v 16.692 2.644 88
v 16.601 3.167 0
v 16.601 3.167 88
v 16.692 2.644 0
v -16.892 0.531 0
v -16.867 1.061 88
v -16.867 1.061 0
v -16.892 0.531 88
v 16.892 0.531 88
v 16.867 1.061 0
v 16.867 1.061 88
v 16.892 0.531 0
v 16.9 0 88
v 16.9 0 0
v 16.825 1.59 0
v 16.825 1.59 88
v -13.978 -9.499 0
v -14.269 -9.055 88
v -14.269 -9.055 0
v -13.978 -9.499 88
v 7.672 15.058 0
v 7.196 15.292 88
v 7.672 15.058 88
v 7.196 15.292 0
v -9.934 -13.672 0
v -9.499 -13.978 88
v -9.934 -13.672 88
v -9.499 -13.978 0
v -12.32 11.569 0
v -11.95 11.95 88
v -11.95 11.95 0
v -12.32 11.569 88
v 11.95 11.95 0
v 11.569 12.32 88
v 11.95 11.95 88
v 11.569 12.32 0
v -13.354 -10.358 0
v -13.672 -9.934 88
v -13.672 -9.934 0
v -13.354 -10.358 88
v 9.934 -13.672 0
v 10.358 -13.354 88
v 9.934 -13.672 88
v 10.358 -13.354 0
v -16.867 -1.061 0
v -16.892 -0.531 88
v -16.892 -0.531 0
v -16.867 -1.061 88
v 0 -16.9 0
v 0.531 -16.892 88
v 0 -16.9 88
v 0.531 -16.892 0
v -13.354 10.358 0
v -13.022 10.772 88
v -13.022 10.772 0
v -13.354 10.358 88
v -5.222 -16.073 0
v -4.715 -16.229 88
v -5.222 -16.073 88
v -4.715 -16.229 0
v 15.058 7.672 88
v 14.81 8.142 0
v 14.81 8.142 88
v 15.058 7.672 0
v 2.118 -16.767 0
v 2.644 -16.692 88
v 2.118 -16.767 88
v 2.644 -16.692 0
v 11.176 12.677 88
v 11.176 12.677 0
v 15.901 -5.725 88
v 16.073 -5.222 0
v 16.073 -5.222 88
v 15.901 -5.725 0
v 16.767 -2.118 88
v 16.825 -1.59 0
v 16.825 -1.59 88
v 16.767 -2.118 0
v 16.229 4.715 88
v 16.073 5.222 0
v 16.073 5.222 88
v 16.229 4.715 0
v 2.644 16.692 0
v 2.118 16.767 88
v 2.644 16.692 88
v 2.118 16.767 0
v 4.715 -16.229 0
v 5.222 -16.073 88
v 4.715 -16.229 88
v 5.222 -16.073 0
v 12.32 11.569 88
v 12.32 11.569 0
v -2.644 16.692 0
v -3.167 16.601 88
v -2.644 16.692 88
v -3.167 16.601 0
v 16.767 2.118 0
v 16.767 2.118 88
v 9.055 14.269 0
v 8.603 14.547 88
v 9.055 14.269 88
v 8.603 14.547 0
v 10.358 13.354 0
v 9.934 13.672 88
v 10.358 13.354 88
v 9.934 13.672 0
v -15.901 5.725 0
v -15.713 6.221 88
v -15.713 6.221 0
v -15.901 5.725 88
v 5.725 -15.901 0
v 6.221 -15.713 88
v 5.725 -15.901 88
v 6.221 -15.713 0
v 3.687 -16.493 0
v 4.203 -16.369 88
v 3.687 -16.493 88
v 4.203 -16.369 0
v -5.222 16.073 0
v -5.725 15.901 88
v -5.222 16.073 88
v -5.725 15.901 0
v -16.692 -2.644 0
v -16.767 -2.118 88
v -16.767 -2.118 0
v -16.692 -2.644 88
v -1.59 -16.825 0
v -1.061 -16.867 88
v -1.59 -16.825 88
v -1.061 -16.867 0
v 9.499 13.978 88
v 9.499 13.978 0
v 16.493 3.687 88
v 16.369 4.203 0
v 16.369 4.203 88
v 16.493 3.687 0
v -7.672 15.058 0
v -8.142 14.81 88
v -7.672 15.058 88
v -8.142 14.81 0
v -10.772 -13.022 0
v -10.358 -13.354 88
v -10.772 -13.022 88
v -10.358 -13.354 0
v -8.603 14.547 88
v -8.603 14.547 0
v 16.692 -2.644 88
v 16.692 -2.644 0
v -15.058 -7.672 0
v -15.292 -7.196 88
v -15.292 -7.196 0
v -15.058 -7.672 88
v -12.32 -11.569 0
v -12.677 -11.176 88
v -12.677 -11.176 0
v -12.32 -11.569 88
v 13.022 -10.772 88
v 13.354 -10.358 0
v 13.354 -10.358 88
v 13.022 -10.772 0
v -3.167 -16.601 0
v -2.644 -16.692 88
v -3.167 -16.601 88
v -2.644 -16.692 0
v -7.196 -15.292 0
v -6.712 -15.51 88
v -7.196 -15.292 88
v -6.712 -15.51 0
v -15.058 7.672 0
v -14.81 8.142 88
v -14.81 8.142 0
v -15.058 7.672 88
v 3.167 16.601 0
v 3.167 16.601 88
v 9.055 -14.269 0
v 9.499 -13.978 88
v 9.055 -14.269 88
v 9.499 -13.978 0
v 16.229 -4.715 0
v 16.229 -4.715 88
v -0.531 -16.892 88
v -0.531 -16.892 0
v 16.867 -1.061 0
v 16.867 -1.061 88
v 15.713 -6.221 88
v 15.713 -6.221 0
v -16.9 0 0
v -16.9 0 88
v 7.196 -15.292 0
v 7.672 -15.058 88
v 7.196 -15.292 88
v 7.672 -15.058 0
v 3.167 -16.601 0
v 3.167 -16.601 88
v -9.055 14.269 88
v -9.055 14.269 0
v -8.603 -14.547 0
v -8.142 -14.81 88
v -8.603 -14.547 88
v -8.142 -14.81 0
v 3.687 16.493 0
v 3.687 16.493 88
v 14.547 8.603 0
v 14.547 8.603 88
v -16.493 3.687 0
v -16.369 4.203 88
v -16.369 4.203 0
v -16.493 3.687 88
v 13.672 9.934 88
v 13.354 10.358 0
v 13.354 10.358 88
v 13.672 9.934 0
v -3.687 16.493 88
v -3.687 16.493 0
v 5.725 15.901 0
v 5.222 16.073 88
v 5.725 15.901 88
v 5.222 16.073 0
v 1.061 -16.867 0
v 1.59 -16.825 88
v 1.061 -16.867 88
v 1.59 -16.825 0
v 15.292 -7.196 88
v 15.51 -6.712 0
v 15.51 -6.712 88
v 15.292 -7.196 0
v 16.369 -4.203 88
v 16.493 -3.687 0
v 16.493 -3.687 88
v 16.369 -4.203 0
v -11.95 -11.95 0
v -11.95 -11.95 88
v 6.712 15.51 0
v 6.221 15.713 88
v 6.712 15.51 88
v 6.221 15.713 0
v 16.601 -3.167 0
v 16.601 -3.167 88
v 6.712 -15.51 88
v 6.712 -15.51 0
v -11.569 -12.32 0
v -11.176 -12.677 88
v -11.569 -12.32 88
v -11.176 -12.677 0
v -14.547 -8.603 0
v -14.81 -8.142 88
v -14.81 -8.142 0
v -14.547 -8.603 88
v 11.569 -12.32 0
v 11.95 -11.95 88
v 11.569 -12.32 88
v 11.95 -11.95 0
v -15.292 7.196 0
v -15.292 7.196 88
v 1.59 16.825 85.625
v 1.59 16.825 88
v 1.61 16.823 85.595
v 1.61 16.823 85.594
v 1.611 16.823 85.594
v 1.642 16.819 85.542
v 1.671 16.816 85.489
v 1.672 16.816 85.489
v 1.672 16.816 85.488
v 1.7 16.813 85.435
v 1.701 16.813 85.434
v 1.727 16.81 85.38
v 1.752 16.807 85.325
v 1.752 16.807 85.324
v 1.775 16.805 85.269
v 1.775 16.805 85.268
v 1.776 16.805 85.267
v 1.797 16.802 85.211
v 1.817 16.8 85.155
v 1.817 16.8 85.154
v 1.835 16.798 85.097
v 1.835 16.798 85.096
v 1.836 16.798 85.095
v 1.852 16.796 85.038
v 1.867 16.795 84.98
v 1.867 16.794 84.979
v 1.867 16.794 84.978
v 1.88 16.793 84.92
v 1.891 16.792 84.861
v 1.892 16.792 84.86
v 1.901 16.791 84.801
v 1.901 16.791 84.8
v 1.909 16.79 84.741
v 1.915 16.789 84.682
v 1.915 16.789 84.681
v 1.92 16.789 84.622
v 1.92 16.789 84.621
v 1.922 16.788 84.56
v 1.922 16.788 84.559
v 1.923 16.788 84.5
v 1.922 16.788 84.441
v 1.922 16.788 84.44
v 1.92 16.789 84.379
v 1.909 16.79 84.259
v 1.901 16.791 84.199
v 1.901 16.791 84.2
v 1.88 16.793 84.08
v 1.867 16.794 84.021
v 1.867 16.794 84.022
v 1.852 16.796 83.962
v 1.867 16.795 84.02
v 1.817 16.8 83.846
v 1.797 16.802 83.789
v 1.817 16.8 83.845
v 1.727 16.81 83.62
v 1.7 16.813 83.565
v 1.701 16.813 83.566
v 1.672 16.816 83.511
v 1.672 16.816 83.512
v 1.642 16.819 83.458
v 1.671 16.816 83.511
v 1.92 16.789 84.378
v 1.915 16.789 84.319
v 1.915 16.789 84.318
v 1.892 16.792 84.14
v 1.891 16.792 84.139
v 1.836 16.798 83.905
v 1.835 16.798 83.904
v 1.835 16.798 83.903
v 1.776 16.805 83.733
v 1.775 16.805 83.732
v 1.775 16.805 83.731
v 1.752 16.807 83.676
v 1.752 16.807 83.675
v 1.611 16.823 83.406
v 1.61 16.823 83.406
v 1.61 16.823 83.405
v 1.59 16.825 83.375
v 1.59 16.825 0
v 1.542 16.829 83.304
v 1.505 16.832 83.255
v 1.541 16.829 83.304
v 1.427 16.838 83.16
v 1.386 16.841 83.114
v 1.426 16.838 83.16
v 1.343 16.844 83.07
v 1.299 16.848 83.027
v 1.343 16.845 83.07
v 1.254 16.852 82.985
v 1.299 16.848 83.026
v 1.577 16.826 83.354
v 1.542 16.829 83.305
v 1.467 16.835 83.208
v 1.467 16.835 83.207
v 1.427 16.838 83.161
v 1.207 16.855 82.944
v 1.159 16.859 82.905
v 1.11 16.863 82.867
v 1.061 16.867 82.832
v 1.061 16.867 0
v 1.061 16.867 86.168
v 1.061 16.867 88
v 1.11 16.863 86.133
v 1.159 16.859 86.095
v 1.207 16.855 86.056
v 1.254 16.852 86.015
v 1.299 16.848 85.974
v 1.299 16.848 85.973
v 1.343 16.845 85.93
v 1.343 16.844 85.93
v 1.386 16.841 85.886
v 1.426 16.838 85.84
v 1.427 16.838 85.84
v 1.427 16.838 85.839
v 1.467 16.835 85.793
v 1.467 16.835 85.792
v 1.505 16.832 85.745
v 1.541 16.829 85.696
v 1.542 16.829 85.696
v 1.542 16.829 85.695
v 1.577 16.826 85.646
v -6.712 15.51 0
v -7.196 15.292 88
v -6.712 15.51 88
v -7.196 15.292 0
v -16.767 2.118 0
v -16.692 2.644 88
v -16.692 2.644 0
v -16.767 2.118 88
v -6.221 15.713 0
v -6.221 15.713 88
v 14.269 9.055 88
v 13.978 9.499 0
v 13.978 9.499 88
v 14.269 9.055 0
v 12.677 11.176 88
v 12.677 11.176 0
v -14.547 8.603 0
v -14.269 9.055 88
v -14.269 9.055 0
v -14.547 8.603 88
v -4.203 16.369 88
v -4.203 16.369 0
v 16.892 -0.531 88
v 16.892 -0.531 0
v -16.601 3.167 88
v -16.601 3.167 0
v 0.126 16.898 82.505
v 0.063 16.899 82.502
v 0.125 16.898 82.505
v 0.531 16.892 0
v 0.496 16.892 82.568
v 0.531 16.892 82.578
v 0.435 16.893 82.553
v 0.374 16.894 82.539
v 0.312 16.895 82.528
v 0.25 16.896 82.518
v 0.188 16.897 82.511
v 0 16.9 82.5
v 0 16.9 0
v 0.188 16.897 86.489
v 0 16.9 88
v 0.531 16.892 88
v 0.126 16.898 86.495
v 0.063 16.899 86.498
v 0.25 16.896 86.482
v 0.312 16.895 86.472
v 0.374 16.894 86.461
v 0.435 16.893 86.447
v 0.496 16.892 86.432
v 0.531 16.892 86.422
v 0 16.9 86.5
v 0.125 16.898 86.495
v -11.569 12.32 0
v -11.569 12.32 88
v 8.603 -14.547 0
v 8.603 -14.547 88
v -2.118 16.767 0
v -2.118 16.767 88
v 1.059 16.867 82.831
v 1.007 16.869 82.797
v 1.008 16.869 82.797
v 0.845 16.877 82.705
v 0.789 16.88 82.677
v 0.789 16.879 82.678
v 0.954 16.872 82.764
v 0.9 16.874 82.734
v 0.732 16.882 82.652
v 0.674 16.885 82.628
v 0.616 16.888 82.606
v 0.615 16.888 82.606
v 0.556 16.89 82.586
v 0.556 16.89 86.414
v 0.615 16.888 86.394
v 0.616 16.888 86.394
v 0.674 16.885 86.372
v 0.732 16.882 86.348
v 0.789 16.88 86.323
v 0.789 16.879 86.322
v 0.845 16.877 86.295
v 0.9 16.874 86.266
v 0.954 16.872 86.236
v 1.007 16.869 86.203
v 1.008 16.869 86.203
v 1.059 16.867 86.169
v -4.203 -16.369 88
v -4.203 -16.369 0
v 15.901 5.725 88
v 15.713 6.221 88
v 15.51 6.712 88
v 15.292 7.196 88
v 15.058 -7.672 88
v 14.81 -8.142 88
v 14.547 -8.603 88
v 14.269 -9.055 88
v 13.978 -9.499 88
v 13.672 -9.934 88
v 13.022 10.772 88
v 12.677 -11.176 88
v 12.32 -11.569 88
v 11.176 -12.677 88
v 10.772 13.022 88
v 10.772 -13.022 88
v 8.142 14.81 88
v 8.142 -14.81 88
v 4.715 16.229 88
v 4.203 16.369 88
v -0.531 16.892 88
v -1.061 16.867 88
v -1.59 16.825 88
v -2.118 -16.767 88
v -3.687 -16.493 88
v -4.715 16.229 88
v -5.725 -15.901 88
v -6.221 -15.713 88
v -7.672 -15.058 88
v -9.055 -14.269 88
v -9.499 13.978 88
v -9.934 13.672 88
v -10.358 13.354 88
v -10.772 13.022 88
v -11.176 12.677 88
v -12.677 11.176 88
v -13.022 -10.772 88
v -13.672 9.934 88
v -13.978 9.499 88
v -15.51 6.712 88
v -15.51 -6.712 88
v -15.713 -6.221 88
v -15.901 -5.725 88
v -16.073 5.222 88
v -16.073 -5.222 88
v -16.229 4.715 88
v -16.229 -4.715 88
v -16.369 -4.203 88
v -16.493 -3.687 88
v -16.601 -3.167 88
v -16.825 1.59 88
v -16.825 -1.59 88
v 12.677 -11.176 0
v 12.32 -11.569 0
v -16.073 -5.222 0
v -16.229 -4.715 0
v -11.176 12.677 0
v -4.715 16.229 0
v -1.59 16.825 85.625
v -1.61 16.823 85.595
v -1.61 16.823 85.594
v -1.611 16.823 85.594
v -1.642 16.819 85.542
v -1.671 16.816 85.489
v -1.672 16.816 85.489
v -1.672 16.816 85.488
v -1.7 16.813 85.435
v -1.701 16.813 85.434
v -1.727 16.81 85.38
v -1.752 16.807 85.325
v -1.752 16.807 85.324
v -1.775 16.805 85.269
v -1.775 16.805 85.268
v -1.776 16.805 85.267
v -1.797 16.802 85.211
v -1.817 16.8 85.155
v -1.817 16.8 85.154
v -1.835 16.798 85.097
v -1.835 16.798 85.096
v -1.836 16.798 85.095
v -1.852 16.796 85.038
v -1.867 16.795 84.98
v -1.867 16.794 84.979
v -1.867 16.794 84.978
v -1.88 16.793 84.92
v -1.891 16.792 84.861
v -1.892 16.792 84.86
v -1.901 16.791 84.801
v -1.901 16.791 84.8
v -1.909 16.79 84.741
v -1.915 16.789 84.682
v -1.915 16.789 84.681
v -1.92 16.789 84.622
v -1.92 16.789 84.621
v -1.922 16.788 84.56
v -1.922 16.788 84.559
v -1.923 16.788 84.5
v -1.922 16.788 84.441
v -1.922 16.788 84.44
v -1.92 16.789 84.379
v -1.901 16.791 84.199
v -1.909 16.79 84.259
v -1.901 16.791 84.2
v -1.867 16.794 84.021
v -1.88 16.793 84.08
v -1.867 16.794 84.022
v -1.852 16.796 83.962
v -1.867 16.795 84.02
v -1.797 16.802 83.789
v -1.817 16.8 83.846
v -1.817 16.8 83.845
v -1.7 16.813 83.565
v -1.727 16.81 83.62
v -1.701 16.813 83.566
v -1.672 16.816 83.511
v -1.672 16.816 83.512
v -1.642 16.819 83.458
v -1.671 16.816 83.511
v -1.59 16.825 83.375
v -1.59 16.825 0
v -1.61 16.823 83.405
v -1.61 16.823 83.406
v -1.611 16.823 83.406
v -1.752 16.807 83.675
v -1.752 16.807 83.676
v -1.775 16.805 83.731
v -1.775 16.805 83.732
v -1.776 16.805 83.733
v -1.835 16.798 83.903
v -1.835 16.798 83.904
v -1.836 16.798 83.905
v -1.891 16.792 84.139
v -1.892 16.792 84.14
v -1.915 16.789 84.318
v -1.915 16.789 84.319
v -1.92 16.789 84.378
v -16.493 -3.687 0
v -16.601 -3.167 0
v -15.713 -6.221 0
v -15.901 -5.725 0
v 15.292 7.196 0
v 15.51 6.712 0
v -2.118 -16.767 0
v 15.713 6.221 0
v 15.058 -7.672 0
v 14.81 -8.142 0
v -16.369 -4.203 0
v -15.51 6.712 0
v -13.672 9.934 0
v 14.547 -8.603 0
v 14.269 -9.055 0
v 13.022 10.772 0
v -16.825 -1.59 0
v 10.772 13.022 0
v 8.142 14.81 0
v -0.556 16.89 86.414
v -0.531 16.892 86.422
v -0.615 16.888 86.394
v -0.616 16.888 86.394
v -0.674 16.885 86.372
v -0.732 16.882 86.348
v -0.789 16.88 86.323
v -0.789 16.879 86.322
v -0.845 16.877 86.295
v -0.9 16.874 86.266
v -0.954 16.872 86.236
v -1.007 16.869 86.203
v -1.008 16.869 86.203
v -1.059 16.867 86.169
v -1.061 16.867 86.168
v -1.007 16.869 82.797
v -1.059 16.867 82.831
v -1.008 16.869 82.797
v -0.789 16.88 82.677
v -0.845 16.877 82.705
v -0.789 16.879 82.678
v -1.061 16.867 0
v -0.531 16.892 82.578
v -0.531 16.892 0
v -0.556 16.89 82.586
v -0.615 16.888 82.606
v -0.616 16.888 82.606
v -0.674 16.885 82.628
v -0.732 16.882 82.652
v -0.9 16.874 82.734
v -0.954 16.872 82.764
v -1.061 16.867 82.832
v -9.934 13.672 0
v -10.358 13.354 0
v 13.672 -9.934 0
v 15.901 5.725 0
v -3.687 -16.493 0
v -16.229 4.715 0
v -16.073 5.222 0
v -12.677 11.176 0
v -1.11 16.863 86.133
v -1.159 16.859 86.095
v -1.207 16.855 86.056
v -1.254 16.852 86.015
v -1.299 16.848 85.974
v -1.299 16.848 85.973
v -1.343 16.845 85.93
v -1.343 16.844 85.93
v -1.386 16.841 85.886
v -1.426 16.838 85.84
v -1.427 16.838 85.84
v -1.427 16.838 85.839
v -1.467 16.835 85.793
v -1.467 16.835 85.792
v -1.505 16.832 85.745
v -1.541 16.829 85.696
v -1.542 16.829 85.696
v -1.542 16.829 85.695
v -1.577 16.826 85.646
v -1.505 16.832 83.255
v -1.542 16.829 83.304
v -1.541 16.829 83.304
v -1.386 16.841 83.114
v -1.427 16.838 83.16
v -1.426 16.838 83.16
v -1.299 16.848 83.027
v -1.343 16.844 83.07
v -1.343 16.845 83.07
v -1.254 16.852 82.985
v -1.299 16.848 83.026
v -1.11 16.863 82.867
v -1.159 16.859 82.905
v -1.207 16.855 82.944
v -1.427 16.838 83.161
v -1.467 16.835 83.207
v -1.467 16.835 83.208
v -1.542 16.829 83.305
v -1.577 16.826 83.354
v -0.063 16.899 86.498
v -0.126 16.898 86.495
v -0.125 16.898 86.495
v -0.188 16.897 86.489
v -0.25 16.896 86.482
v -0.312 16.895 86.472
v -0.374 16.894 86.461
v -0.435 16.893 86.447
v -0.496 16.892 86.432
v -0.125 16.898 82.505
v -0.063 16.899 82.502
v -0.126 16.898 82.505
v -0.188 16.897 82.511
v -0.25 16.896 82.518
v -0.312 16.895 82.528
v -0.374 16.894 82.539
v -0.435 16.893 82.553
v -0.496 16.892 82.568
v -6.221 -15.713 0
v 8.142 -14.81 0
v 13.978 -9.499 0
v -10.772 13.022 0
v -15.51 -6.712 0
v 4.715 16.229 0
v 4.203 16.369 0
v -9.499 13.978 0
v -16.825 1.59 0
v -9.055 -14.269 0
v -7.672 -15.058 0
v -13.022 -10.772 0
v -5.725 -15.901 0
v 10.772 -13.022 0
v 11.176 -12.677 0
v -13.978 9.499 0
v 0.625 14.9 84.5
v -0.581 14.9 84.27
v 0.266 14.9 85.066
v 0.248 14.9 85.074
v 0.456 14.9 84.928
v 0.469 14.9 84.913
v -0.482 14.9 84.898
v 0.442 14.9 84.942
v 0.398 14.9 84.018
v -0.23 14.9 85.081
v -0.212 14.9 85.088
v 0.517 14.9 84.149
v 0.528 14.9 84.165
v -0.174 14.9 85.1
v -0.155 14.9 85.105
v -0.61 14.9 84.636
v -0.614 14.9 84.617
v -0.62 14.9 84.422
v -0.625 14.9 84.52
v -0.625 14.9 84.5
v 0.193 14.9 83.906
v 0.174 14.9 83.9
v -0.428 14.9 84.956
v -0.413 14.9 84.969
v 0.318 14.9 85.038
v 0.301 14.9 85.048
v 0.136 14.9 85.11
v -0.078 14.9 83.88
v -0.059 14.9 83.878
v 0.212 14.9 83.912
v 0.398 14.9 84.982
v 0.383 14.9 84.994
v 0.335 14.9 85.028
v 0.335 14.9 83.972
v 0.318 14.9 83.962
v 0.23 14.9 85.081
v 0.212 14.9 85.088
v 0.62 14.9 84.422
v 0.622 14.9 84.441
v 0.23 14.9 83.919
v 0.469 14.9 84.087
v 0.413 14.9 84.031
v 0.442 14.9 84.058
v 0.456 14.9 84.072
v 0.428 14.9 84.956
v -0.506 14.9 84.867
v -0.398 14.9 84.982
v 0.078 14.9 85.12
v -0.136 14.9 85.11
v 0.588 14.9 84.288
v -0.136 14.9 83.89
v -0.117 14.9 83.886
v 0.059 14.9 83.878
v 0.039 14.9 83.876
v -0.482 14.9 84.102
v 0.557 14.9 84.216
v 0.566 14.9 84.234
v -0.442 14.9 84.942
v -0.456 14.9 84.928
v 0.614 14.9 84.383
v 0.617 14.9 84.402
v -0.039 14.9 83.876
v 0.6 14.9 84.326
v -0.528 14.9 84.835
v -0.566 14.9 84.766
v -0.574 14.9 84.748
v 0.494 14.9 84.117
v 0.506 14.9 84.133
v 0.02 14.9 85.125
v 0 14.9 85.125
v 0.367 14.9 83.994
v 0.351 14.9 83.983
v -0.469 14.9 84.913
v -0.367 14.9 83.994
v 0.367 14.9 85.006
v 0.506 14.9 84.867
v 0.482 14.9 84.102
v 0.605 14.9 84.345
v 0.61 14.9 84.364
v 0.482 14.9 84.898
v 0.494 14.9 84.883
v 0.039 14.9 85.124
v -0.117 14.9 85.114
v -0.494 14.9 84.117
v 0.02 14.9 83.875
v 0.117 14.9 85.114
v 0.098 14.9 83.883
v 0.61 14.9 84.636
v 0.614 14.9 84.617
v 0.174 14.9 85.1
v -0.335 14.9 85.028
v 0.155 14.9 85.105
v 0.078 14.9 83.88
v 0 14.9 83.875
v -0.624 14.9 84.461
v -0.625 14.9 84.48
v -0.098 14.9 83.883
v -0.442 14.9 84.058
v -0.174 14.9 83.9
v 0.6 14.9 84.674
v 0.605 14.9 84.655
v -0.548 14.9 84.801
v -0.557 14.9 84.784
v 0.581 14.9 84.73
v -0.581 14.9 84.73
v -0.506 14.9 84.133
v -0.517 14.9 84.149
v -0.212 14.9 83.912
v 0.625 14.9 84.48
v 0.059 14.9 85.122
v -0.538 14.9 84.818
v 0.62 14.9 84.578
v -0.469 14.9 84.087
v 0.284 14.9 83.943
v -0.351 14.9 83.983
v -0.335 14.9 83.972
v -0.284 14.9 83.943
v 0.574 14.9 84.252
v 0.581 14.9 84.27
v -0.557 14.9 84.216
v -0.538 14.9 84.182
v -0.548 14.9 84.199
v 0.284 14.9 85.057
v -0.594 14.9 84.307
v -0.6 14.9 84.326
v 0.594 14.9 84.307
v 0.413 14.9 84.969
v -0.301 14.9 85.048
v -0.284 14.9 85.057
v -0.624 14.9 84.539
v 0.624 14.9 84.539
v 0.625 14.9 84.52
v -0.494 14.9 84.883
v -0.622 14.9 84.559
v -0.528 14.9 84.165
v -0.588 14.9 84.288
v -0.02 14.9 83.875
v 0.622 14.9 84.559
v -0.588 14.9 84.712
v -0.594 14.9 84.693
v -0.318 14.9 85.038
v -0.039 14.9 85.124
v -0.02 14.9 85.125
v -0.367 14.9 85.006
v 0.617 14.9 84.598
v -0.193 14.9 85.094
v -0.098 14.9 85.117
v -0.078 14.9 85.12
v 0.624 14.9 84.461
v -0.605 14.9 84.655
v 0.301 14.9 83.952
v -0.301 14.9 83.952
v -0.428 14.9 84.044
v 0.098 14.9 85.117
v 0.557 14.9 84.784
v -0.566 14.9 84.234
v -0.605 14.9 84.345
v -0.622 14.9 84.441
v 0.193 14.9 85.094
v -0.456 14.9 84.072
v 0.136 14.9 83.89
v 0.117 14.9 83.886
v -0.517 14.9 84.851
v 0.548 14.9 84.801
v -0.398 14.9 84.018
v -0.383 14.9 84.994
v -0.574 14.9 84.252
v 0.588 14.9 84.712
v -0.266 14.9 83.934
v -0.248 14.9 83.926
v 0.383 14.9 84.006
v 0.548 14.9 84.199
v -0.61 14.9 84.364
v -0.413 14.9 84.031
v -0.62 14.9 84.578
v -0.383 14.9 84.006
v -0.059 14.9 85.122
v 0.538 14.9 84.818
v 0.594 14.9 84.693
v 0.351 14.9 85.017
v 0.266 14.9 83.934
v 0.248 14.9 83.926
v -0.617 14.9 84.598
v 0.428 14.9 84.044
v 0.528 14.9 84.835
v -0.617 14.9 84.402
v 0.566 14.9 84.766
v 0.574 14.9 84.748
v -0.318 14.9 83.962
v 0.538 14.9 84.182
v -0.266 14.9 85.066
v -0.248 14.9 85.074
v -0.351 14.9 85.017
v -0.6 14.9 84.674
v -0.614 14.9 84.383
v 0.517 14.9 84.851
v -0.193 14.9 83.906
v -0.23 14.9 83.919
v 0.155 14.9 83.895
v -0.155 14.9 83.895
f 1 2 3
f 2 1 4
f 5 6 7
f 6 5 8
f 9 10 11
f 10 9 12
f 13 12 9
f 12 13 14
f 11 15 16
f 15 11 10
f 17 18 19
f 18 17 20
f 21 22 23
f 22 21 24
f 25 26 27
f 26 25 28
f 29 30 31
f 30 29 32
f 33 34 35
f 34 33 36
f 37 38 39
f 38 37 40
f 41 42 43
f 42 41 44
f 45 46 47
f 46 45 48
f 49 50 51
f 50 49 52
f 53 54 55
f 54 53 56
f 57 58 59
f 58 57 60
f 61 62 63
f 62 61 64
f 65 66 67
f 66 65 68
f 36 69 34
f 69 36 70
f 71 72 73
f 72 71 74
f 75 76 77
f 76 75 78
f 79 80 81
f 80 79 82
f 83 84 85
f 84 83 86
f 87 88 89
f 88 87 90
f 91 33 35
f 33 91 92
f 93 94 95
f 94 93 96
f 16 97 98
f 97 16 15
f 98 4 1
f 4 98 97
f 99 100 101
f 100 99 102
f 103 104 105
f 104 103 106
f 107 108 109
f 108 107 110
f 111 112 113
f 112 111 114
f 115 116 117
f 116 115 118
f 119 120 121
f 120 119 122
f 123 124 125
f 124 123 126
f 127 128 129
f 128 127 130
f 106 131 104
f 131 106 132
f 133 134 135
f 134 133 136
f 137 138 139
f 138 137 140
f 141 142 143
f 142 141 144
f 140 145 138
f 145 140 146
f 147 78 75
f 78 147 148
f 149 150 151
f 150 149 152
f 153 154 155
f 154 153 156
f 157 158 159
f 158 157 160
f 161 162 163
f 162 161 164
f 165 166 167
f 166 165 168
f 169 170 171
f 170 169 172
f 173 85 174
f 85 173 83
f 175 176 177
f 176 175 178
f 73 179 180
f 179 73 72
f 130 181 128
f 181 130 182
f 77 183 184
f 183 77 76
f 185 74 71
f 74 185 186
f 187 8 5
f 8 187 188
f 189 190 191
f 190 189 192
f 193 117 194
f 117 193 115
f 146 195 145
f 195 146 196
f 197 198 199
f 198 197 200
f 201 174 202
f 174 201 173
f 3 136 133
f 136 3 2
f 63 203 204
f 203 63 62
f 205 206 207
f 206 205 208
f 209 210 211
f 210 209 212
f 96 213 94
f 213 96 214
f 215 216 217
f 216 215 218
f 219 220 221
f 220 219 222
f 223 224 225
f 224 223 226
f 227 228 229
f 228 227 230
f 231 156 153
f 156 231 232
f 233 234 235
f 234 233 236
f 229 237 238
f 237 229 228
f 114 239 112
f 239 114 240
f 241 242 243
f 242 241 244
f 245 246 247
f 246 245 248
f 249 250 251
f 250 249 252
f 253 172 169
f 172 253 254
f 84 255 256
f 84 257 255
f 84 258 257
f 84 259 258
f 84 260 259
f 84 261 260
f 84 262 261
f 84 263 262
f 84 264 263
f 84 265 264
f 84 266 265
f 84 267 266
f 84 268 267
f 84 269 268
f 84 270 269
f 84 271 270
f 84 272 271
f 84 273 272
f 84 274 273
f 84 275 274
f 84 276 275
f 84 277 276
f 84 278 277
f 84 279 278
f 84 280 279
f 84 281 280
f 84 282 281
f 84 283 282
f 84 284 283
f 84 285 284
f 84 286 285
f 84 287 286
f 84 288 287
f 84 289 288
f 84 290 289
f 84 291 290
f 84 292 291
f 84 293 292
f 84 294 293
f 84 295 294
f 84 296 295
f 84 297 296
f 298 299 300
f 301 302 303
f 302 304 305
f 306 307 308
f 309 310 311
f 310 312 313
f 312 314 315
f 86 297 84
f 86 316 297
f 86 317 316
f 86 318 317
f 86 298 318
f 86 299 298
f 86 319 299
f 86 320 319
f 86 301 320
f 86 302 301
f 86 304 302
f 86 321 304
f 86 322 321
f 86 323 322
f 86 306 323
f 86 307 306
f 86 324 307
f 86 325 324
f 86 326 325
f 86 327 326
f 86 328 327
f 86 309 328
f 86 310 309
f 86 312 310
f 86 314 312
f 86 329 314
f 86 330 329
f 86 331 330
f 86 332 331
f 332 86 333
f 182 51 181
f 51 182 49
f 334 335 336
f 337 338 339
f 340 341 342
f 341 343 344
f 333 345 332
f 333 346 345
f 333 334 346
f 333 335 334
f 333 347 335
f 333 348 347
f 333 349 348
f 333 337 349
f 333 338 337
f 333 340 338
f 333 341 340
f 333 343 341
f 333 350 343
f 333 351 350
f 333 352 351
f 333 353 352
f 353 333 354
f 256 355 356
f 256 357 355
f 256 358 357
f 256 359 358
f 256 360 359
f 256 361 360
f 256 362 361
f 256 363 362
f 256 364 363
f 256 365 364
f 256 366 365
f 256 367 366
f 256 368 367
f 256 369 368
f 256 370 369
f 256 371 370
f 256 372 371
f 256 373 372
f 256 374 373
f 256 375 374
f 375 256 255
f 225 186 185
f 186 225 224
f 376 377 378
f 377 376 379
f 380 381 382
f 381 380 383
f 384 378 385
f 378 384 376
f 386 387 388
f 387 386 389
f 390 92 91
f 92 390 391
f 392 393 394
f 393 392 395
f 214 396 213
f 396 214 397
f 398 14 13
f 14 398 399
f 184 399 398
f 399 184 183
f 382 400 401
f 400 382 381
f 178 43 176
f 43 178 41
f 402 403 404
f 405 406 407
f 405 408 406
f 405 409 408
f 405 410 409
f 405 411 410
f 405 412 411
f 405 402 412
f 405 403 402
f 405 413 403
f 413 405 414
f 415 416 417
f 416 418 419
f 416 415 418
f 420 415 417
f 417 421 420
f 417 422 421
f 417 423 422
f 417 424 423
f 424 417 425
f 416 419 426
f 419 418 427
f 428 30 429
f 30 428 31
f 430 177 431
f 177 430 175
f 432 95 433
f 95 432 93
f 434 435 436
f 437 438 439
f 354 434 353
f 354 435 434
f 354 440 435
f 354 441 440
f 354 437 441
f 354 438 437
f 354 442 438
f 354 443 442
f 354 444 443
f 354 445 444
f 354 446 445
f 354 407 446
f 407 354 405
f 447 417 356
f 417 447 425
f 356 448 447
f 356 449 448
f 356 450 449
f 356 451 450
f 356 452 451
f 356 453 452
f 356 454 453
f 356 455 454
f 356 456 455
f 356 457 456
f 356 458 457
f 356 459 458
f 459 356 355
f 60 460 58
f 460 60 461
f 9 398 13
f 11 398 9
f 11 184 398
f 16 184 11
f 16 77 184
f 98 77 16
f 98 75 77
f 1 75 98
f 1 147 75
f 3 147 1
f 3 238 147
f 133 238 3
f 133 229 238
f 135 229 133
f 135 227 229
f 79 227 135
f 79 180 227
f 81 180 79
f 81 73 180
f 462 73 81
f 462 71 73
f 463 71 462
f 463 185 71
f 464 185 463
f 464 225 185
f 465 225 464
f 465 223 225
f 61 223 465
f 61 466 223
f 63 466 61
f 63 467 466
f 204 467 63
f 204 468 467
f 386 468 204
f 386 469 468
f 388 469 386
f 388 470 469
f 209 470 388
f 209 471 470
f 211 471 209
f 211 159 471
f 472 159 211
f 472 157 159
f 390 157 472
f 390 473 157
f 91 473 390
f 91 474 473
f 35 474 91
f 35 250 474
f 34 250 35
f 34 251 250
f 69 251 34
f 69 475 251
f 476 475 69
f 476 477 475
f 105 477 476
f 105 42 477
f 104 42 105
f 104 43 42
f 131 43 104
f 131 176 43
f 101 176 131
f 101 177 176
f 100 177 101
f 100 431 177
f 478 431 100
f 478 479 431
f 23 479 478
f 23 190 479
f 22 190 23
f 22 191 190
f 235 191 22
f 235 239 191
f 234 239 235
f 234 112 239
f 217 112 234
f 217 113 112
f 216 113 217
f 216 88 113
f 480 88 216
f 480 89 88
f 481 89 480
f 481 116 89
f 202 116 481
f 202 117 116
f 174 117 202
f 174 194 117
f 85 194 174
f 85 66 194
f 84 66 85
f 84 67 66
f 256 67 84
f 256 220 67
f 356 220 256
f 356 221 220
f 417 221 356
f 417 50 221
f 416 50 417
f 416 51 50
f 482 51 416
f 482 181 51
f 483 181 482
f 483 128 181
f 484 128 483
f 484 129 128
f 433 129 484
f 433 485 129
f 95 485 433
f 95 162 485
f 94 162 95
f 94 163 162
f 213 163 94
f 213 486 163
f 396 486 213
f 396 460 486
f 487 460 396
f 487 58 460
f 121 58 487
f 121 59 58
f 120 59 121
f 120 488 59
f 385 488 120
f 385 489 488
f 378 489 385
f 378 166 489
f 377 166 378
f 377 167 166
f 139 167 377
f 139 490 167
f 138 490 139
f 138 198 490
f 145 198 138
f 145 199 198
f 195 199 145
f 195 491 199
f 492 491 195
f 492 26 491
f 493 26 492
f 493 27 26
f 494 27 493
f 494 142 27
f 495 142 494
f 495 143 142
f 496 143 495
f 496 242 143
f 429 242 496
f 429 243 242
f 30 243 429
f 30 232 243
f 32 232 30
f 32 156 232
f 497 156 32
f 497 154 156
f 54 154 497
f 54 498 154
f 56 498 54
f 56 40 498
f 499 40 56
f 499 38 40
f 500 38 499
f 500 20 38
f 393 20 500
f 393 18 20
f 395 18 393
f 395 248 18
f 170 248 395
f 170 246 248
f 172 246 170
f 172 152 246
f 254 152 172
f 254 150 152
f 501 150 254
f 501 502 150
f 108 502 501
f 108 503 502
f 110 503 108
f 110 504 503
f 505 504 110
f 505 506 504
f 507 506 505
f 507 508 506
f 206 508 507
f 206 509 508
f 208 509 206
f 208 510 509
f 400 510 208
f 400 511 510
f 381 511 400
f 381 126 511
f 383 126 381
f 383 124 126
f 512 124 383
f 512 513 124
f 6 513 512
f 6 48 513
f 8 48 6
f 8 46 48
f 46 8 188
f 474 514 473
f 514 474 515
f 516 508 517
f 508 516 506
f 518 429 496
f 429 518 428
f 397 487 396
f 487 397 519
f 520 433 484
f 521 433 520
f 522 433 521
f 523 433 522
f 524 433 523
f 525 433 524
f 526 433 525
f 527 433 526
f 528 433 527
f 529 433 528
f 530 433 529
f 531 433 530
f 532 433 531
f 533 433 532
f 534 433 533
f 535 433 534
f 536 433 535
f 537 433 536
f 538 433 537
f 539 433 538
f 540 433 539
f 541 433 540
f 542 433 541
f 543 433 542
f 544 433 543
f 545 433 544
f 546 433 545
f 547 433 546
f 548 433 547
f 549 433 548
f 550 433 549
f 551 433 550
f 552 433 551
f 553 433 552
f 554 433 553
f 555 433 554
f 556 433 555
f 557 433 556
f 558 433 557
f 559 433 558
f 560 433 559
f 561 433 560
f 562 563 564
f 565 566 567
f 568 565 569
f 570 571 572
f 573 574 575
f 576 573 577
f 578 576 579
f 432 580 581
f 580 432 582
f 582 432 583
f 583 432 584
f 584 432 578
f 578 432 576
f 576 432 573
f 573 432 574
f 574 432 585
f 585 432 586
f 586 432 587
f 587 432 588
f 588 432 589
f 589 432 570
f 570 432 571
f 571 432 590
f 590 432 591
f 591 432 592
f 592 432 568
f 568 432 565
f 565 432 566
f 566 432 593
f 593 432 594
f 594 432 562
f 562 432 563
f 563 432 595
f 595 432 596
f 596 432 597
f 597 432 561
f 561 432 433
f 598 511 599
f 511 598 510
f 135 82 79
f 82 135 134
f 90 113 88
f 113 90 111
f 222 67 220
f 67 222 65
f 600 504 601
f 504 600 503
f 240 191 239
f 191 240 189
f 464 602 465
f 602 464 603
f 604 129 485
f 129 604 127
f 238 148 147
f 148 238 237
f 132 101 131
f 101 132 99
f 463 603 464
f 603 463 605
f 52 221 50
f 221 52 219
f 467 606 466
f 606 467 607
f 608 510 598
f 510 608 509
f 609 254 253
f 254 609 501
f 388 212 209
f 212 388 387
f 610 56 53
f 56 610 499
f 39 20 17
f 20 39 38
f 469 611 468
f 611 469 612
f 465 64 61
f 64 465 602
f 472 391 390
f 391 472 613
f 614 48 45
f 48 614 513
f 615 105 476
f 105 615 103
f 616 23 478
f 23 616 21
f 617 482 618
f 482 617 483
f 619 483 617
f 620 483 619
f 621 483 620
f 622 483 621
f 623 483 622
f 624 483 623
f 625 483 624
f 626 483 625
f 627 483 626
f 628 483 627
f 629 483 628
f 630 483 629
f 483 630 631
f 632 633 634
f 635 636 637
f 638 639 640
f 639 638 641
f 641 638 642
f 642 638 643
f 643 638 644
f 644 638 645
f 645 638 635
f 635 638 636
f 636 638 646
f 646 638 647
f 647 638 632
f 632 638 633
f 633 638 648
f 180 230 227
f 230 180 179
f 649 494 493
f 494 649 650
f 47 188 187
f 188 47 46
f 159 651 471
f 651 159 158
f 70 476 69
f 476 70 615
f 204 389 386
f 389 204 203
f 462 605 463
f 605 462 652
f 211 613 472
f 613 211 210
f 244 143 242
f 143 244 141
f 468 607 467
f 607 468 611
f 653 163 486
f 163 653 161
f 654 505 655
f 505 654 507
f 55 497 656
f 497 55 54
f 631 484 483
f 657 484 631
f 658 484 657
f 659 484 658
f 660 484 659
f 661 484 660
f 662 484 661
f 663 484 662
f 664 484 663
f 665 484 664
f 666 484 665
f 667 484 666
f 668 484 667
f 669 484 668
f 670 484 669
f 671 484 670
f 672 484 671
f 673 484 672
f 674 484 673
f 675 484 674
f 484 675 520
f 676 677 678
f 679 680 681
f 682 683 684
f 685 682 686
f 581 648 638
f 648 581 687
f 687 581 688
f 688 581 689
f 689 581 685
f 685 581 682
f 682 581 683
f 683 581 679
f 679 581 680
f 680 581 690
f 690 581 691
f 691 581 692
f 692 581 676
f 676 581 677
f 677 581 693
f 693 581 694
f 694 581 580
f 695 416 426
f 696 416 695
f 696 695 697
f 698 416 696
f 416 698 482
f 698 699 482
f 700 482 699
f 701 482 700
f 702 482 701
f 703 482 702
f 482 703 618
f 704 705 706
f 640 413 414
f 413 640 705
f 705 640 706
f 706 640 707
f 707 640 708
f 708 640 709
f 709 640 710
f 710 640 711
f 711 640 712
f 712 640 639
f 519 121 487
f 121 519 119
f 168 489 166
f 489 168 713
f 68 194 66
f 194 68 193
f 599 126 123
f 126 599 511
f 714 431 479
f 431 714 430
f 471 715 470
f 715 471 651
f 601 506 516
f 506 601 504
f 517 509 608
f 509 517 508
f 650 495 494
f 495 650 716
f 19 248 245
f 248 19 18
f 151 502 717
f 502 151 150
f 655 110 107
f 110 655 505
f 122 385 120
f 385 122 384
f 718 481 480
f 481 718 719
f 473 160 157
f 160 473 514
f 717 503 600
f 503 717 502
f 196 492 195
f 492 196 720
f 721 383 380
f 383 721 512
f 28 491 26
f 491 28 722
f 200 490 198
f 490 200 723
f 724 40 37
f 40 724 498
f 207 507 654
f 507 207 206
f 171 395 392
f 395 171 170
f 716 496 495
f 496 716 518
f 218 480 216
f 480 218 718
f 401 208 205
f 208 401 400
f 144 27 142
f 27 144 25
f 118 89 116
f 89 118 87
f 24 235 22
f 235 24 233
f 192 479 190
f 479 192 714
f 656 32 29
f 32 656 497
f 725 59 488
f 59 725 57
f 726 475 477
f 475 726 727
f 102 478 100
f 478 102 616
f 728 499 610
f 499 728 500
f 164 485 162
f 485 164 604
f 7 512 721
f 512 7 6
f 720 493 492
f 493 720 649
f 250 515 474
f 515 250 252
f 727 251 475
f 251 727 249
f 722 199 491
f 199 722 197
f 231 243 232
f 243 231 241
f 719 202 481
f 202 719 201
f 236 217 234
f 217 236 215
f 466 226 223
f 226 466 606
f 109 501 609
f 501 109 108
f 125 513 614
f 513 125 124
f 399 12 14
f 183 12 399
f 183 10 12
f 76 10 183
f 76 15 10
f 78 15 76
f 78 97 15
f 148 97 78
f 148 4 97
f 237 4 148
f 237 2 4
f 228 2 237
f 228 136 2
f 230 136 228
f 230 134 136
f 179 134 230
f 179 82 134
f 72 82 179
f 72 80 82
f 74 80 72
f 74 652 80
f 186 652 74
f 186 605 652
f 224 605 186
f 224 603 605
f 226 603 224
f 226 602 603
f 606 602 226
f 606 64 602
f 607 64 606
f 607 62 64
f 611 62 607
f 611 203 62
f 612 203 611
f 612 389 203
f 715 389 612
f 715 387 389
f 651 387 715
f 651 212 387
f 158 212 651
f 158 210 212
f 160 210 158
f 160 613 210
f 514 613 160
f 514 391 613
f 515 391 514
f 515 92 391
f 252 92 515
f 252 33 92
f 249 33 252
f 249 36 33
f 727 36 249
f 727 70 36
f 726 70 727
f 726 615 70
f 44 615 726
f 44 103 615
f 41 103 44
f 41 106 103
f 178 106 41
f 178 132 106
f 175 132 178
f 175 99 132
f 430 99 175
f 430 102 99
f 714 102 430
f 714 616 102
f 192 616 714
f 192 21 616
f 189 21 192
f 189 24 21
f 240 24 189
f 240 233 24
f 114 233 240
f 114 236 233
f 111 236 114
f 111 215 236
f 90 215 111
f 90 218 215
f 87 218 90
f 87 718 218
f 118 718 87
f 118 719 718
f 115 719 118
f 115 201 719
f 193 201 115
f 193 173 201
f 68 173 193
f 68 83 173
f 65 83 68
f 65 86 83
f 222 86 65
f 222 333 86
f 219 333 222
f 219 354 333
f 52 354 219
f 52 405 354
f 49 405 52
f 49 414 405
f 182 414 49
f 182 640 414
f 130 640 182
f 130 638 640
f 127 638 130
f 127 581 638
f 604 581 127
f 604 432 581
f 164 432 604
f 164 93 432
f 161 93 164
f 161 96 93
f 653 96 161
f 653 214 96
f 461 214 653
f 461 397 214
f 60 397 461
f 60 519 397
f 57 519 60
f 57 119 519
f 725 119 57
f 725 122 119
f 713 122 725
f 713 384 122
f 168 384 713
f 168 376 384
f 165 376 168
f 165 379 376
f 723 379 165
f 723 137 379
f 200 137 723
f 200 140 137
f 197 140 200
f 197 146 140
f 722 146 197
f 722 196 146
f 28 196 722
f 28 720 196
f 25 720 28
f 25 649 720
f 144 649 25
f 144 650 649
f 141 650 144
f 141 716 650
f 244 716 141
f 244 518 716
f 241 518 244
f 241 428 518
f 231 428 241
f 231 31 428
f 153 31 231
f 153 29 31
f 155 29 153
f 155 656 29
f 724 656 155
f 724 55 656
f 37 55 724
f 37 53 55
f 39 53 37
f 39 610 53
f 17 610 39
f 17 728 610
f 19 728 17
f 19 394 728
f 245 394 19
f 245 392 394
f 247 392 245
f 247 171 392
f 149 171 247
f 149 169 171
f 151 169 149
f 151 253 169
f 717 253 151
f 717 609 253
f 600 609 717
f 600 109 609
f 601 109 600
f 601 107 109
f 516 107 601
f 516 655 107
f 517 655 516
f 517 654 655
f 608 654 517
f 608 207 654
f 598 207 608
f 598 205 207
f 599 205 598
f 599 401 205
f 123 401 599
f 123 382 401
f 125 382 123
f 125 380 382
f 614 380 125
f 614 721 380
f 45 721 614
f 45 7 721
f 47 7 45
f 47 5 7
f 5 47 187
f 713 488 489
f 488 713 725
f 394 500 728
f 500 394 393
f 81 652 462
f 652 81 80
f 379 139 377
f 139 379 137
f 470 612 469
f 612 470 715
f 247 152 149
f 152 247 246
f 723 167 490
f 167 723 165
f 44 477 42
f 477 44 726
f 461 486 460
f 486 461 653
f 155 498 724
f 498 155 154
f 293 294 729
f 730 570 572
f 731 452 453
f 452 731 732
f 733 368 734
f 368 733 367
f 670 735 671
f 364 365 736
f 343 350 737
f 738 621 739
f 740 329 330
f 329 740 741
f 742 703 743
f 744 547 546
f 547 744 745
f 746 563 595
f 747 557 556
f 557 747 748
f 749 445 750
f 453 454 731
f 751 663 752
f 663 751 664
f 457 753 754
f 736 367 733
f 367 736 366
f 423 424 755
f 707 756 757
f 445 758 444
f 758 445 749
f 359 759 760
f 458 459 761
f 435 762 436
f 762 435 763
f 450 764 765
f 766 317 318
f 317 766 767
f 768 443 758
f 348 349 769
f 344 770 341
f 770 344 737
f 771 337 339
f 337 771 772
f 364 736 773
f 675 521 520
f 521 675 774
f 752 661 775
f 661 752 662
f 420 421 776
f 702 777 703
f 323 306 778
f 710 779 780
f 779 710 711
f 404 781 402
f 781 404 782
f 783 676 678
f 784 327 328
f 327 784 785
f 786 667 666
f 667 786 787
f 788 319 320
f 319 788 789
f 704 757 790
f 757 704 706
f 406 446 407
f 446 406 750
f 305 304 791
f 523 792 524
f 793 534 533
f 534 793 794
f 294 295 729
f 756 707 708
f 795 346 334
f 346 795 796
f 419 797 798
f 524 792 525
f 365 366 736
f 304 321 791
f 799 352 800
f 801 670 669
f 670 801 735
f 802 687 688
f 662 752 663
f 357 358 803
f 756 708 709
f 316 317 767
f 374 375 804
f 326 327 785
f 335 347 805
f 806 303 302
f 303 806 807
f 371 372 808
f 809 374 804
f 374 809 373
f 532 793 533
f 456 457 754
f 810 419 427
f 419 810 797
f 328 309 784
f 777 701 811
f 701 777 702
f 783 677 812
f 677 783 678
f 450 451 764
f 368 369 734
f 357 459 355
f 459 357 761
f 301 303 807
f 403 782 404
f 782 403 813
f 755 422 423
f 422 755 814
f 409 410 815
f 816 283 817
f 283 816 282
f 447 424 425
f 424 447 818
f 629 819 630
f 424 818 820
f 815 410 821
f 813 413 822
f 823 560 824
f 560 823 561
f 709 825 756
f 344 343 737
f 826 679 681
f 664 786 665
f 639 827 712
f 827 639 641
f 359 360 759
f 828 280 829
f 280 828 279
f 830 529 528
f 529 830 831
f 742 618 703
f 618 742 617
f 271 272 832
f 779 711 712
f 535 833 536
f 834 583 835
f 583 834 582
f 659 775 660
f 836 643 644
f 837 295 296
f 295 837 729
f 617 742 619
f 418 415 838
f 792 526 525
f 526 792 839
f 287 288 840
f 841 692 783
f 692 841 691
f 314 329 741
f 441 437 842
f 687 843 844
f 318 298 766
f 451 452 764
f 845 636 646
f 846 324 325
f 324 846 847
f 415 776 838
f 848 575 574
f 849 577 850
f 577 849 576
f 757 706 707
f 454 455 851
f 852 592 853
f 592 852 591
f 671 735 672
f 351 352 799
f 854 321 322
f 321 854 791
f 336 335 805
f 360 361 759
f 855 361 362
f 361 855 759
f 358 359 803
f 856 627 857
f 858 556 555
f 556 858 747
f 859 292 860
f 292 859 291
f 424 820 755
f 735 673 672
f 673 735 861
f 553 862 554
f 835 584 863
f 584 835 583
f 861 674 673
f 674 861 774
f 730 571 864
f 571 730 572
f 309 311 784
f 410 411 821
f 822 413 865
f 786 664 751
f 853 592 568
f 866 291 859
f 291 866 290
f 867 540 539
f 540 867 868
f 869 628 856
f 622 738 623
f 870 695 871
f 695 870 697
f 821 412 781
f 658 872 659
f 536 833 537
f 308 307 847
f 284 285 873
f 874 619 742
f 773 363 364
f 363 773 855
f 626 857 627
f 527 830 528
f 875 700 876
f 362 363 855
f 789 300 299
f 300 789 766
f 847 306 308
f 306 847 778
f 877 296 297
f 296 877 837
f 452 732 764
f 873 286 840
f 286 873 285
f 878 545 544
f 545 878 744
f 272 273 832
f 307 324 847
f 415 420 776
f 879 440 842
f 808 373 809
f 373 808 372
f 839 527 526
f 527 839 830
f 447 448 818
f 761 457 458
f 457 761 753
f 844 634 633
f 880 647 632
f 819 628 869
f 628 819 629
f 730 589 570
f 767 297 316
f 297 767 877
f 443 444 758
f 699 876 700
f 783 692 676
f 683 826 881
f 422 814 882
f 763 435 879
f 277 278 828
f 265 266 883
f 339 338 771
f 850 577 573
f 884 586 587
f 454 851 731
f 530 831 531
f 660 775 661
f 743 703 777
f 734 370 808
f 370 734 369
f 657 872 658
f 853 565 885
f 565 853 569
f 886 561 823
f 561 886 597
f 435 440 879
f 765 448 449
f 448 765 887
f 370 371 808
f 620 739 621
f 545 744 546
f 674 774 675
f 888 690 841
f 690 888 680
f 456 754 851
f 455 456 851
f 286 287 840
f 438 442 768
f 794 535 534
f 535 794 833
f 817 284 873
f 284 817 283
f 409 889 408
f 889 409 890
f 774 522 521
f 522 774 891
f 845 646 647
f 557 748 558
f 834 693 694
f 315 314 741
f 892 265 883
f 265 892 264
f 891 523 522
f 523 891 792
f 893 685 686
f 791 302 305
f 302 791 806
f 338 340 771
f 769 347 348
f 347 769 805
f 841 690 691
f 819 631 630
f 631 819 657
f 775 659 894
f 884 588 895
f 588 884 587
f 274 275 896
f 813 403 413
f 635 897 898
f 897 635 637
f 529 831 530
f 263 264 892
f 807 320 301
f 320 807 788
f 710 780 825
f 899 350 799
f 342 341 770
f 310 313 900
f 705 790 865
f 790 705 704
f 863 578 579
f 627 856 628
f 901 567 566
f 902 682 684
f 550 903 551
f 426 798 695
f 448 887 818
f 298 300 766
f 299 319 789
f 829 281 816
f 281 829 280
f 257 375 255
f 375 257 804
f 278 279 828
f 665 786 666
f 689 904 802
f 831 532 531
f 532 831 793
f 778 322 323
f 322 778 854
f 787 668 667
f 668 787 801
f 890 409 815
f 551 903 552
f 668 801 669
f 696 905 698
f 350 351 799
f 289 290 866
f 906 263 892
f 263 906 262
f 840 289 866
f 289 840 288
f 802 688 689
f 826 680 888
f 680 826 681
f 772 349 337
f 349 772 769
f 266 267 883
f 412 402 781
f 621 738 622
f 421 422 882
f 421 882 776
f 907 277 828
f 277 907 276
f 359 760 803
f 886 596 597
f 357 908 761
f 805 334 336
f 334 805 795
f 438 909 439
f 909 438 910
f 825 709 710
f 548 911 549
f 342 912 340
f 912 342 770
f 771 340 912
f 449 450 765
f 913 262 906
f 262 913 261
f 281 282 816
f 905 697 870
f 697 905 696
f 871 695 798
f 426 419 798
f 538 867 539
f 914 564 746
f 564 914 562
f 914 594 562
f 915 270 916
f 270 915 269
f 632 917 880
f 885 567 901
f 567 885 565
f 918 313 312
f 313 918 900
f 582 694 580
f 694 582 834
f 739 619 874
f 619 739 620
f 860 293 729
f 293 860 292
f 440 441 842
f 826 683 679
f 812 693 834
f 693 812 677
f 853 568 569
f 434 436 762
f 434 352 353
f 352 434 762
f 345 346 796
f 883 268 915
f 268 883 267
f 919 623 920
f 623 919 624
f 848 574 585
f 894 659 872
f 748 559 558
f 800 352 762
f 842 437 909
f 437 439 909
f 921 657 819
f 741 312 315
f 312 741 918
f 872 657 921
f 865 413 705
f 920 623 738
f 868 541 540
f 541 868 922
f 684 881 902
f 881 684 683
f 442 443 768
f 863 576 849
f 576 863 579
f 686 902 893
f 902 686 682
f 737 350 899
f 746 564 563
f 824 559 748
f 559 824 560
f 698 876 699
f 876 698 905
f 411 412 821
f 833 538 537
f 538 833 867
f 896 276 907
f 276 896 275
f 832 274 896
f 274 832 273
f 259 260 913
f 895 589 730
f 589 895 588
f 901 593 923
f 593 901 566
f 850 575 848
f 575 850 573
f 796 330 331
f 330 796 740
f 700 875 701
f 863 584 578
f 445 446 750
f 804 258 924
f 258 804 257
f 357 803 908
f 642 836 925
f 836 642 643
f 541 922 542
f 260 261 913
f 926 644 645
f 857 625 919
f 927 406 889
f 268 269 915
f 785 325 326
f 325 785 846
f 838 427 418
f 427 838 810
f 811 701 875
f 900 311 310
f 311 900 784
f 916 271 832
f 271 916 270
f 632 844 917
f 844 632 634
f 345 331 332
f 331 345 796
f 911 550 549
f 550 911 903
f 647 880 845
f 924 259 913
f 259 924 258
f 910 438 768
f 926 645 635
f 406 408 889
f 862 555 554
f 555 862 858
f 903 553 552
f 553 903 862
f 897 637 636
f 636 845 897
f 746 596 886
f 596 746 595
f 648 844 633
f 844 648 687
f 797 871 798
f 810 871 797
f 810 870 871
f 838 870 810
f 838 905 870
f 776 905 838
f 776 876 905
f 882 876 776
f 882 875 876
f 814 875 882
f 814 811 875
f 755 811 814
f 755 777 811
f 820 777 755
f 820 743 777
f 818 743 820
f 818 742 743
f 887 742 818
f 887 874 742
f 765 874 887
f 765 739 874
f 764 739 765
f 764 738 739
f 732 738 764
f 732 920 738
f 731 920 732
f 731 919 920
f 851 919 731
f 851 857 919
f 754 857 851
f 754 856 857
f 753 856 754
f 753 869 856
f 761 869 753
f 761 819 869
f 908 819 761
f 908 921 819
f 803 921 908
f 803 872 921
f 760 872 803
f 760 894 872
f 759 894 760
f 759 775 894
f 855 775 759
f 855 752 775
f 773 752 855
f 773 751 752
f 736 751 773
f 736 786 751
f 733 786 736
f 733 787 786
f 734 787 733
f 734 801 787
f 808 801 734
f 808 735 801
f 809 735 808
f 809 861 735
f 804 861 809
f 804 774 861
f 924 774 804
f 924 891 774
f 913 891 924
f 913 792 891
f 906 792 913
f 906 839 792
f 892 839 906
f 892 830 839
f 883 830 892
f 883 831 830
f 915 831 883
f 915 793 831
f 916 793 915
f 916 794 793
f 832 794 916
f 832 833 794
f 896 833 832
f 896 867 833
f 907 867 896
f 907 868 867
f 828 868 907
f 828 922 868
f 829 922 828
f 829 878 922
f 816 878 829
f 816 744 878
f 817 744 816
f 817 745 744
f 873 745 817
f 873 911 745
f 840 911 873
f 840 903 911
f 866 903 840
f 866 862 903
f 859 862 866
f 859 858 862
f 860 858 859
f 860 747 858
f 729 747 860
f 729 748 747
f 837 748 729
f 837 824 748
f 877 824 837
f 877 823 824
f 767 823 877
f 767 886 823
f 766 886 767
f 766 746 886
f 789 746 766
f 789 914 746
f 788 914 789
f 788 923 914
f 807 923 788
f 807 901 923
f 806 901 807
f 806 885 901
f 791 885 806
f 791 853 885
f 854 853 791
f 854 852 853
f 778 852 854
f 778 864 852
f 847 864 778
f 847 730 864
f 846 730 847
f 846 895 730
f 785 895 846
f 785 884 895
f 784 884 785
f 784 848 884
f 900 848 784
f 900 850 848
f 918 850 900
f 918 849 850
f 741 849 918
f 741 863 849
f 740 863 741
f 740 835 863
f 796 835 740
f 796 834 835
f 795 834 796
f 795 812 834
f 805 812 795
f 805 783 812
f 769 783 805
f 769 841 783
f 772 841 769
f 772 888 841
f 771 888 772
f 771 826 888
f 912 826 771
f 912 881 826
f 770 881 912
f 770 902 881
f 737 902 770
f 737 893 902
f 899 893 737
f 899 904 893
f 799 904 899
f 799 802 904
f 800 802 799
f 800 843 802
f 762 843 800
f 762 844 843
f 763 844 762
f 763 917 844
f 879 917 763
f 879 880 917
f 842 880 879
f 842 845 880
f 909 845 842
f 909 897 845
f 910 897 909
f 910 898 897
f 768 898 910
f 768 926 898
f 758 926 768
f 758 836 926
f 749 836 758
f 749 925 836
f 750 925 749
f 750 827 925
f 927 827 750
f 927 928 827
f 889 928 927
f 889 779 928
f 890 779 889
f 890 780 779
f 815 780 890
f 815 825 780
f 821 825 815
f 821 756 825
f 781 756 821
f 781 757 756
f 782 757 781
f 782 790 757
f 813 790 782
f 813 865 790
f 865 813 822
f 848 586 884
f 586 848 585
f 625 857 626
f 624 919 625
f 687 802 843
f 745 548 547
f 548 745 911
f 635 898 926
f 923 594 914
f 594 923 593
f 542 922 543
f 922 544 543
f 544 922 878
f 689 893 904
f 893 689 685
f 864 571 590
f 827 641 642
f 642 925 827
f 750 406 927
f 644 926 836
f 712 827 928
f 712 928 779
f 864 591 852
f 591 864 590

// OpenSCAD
//These measurements work well on my machine for PETG at 100% scale and 101% flow and PLA at 104% scale and 99% flow.
cylinder_diameter=33.8;
cylinder_height=88;
cone_base=4;
cone_tip=1.25;
cone_height=2;
$fn=200;

difference(){
cylinder(d=cylinder_diameter,h=cylinder_height);
translate([0,cylinder_diameter/2,cylinder_height-cone_base/2-1.5])
rotate([90,0,0]){
cylinder(d1=cone_base,d2=cone_tip,h=cone_height);
}
}
